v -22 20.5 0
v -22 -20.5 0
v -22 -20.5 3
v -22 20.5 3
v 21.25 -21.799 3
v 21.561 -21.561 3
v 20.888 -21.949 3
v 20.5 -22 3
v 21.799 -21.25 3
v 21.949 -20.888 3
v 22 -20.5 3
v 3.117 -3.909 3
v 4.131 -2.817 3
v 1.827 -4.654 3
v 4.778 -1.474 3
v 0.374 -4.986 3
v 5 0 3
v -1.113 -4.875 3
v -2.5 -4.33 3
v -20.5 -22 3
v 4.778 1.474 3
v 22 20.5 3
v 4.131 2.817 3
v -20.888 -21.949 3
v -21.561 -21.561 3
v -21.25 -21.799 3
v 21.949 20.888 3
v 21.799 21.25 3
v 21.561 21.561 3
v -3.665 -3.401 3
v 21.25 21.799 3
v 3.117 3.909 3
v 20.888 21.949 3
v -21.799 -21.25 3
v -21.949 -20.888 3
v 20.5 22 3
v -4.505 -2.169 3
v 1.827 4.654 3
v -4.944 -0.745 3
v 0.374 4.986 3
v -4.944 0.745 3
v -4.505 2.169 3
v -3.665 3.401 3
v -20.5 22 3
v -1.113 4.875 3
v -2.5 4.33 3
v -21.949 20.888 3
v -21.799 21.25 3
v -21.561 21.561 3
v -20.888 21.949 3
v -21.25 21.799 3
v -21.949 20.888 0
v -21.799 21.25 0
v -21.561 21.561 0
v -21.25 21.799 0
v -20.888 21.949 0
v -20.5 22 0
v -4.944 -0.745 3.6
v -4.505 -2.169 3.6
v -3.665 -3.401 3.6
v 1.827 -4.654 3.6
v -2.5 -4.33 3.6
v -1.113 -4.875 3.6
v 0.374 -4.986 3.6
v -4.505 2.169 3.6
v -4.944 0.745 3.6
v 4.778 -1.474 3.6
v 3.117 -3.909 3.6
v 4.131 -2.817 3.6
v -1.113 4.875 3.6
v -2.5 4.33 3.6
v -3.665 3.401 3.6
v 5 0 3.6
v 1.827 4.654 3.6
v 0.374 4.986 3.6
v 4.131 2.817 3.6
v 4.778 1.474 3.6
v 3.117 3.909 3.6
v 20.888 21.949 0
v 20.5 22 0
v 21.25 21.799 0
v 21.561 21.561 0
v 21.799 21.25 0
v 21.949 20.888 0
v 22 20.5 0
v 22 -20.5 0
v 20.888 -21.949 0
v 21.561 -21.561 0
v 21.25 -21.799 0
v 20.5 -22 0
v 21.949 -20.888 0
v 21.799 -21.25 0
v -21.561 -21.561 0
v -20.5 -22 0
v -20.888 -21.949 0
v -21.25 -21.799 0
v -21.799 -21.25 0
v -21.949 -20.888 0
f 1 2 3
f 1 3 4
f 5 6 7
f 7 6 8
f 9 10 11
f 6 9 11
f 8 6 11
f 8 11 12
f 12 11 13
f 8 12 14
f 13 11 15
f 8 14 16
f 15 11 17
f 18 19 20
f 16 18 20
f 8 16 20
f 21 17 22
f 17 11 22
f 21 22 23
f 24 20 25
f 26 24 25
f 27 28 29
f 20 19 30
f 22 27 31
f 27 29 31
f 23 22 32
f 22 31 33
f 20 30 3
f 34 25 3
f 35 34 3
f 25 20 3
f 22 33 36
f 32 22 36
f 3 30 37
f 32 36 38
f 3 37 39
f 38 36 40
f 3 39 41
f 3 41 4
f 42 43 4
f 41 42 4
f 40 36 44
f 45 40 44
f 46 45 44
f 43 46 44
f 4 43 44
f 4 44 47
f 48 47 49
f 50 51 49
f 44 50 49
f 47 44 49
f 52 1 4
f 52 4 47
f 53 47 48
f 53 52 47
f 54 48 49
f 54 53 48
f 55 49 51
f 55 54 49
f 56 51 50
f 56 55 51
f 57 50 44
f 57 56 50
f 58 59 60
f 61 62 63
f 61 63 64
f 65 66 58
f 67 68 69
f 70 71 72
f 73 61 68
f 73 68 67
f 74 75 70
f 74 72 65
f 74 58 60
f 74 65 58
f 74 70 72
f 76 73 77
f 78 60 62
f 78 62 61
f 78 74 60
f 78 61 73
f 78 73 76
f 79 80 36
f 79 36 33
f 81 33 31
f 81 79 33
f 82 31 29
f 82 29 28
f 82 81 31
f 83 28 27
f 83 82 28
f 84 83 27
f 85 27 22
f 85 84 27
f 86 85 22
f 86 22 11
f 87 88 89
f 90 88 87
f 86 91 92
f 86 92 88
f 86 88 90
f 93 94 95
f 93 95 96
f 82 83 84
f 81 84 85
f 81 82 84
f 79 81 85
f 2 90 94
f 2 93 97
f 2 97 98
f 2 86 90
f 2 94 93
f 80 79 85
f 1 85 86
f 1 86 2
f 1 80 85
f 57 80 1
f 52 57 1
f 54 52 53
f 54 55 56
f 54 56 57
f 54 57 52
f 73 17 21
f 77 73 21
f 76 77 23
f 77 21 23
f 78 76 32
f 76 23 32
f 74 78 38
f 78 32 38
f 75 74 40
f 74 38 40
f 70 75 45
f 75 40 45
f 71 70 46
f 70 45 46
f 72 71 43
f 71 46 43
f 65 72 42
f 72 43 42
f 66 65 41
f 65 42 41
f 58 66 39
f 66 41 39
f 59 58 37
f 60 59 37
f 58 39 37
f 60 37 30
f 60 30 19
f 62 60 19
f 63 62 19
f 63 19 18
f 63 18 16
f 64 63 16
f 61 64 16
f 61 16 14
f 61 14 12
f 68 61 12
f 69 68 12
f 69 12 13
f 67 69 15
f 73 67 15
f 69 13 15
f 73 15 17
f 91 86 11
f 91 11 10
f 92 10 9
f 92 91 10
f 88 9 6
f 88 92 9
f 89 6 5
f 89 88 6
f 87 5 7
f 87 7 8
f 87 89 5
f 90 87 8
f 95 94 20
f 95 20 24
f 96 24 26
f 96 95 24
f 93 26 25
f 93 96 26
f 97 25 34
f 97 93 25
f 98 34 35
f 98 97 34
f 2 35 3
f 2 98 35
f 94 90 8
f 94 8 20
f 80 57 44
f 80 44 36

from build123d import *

# Parameters (mm, degrees)
RESSALTO_EXTRUS_O1_DEPTH = 3
ESBO_O5_R                = 5
RESSALTO_EXTRUS_O2_DEPTH = 0.6


with BuildPart() as part:
    # Esboço4 → Ressalto-extrusão1 (new body)
    with BuildSketch(Plane.XY):
        with BuildLine():
            Line((-22, 0), (-22, 20.5))
            ThreePointArc((-22, 20.5), (-21.560660172, 21.560660173), (-20.499999999, 22.000000002))
            Line((-20.499999999, 22.000000002), (1e-09, 22.000000002))
            Line((1e-09, 22.000000002), (20.500000001, 22.000000002))
            ThreePointArc((20.500000001, 22.000000002), (21.560660174, 21.560660173), (22.000000003, 20.5))
            Line((22.000000003, 20.5), (22.000000003, 0))
            Line((22.000000003, 0), (22.000000003, -20.5))
            ThreePointArc((22.000000003, -20.5), (21.560660175, -21.560660173), (20.500000002, -22.000000002))
            Line((20.500000002, -22.000000002), (1e-09, -22.000000002))
            Line((1e-09, -22.000000002), (-20.499999999, -22.000000002))
            ThreePointArc((-20.499999999, -22.000000002), (-21.560660172, -21.560660173), (-22, -20.5))
            Line((-22, -20.5), (-22, 0))
        make_face()
    extrude(amount=RESSALTO_EXTRUS_O1_DEPTH)

    # Esboço5 → Ressalto-extrusão2 (add)
    with BuildSketch(Plane.XY.offset(3)):
        Circle(ESBO_O5_R)
    extrude(amount=RESSALTO_EXTRUS_O2_DEPTH)


solid = part.part
